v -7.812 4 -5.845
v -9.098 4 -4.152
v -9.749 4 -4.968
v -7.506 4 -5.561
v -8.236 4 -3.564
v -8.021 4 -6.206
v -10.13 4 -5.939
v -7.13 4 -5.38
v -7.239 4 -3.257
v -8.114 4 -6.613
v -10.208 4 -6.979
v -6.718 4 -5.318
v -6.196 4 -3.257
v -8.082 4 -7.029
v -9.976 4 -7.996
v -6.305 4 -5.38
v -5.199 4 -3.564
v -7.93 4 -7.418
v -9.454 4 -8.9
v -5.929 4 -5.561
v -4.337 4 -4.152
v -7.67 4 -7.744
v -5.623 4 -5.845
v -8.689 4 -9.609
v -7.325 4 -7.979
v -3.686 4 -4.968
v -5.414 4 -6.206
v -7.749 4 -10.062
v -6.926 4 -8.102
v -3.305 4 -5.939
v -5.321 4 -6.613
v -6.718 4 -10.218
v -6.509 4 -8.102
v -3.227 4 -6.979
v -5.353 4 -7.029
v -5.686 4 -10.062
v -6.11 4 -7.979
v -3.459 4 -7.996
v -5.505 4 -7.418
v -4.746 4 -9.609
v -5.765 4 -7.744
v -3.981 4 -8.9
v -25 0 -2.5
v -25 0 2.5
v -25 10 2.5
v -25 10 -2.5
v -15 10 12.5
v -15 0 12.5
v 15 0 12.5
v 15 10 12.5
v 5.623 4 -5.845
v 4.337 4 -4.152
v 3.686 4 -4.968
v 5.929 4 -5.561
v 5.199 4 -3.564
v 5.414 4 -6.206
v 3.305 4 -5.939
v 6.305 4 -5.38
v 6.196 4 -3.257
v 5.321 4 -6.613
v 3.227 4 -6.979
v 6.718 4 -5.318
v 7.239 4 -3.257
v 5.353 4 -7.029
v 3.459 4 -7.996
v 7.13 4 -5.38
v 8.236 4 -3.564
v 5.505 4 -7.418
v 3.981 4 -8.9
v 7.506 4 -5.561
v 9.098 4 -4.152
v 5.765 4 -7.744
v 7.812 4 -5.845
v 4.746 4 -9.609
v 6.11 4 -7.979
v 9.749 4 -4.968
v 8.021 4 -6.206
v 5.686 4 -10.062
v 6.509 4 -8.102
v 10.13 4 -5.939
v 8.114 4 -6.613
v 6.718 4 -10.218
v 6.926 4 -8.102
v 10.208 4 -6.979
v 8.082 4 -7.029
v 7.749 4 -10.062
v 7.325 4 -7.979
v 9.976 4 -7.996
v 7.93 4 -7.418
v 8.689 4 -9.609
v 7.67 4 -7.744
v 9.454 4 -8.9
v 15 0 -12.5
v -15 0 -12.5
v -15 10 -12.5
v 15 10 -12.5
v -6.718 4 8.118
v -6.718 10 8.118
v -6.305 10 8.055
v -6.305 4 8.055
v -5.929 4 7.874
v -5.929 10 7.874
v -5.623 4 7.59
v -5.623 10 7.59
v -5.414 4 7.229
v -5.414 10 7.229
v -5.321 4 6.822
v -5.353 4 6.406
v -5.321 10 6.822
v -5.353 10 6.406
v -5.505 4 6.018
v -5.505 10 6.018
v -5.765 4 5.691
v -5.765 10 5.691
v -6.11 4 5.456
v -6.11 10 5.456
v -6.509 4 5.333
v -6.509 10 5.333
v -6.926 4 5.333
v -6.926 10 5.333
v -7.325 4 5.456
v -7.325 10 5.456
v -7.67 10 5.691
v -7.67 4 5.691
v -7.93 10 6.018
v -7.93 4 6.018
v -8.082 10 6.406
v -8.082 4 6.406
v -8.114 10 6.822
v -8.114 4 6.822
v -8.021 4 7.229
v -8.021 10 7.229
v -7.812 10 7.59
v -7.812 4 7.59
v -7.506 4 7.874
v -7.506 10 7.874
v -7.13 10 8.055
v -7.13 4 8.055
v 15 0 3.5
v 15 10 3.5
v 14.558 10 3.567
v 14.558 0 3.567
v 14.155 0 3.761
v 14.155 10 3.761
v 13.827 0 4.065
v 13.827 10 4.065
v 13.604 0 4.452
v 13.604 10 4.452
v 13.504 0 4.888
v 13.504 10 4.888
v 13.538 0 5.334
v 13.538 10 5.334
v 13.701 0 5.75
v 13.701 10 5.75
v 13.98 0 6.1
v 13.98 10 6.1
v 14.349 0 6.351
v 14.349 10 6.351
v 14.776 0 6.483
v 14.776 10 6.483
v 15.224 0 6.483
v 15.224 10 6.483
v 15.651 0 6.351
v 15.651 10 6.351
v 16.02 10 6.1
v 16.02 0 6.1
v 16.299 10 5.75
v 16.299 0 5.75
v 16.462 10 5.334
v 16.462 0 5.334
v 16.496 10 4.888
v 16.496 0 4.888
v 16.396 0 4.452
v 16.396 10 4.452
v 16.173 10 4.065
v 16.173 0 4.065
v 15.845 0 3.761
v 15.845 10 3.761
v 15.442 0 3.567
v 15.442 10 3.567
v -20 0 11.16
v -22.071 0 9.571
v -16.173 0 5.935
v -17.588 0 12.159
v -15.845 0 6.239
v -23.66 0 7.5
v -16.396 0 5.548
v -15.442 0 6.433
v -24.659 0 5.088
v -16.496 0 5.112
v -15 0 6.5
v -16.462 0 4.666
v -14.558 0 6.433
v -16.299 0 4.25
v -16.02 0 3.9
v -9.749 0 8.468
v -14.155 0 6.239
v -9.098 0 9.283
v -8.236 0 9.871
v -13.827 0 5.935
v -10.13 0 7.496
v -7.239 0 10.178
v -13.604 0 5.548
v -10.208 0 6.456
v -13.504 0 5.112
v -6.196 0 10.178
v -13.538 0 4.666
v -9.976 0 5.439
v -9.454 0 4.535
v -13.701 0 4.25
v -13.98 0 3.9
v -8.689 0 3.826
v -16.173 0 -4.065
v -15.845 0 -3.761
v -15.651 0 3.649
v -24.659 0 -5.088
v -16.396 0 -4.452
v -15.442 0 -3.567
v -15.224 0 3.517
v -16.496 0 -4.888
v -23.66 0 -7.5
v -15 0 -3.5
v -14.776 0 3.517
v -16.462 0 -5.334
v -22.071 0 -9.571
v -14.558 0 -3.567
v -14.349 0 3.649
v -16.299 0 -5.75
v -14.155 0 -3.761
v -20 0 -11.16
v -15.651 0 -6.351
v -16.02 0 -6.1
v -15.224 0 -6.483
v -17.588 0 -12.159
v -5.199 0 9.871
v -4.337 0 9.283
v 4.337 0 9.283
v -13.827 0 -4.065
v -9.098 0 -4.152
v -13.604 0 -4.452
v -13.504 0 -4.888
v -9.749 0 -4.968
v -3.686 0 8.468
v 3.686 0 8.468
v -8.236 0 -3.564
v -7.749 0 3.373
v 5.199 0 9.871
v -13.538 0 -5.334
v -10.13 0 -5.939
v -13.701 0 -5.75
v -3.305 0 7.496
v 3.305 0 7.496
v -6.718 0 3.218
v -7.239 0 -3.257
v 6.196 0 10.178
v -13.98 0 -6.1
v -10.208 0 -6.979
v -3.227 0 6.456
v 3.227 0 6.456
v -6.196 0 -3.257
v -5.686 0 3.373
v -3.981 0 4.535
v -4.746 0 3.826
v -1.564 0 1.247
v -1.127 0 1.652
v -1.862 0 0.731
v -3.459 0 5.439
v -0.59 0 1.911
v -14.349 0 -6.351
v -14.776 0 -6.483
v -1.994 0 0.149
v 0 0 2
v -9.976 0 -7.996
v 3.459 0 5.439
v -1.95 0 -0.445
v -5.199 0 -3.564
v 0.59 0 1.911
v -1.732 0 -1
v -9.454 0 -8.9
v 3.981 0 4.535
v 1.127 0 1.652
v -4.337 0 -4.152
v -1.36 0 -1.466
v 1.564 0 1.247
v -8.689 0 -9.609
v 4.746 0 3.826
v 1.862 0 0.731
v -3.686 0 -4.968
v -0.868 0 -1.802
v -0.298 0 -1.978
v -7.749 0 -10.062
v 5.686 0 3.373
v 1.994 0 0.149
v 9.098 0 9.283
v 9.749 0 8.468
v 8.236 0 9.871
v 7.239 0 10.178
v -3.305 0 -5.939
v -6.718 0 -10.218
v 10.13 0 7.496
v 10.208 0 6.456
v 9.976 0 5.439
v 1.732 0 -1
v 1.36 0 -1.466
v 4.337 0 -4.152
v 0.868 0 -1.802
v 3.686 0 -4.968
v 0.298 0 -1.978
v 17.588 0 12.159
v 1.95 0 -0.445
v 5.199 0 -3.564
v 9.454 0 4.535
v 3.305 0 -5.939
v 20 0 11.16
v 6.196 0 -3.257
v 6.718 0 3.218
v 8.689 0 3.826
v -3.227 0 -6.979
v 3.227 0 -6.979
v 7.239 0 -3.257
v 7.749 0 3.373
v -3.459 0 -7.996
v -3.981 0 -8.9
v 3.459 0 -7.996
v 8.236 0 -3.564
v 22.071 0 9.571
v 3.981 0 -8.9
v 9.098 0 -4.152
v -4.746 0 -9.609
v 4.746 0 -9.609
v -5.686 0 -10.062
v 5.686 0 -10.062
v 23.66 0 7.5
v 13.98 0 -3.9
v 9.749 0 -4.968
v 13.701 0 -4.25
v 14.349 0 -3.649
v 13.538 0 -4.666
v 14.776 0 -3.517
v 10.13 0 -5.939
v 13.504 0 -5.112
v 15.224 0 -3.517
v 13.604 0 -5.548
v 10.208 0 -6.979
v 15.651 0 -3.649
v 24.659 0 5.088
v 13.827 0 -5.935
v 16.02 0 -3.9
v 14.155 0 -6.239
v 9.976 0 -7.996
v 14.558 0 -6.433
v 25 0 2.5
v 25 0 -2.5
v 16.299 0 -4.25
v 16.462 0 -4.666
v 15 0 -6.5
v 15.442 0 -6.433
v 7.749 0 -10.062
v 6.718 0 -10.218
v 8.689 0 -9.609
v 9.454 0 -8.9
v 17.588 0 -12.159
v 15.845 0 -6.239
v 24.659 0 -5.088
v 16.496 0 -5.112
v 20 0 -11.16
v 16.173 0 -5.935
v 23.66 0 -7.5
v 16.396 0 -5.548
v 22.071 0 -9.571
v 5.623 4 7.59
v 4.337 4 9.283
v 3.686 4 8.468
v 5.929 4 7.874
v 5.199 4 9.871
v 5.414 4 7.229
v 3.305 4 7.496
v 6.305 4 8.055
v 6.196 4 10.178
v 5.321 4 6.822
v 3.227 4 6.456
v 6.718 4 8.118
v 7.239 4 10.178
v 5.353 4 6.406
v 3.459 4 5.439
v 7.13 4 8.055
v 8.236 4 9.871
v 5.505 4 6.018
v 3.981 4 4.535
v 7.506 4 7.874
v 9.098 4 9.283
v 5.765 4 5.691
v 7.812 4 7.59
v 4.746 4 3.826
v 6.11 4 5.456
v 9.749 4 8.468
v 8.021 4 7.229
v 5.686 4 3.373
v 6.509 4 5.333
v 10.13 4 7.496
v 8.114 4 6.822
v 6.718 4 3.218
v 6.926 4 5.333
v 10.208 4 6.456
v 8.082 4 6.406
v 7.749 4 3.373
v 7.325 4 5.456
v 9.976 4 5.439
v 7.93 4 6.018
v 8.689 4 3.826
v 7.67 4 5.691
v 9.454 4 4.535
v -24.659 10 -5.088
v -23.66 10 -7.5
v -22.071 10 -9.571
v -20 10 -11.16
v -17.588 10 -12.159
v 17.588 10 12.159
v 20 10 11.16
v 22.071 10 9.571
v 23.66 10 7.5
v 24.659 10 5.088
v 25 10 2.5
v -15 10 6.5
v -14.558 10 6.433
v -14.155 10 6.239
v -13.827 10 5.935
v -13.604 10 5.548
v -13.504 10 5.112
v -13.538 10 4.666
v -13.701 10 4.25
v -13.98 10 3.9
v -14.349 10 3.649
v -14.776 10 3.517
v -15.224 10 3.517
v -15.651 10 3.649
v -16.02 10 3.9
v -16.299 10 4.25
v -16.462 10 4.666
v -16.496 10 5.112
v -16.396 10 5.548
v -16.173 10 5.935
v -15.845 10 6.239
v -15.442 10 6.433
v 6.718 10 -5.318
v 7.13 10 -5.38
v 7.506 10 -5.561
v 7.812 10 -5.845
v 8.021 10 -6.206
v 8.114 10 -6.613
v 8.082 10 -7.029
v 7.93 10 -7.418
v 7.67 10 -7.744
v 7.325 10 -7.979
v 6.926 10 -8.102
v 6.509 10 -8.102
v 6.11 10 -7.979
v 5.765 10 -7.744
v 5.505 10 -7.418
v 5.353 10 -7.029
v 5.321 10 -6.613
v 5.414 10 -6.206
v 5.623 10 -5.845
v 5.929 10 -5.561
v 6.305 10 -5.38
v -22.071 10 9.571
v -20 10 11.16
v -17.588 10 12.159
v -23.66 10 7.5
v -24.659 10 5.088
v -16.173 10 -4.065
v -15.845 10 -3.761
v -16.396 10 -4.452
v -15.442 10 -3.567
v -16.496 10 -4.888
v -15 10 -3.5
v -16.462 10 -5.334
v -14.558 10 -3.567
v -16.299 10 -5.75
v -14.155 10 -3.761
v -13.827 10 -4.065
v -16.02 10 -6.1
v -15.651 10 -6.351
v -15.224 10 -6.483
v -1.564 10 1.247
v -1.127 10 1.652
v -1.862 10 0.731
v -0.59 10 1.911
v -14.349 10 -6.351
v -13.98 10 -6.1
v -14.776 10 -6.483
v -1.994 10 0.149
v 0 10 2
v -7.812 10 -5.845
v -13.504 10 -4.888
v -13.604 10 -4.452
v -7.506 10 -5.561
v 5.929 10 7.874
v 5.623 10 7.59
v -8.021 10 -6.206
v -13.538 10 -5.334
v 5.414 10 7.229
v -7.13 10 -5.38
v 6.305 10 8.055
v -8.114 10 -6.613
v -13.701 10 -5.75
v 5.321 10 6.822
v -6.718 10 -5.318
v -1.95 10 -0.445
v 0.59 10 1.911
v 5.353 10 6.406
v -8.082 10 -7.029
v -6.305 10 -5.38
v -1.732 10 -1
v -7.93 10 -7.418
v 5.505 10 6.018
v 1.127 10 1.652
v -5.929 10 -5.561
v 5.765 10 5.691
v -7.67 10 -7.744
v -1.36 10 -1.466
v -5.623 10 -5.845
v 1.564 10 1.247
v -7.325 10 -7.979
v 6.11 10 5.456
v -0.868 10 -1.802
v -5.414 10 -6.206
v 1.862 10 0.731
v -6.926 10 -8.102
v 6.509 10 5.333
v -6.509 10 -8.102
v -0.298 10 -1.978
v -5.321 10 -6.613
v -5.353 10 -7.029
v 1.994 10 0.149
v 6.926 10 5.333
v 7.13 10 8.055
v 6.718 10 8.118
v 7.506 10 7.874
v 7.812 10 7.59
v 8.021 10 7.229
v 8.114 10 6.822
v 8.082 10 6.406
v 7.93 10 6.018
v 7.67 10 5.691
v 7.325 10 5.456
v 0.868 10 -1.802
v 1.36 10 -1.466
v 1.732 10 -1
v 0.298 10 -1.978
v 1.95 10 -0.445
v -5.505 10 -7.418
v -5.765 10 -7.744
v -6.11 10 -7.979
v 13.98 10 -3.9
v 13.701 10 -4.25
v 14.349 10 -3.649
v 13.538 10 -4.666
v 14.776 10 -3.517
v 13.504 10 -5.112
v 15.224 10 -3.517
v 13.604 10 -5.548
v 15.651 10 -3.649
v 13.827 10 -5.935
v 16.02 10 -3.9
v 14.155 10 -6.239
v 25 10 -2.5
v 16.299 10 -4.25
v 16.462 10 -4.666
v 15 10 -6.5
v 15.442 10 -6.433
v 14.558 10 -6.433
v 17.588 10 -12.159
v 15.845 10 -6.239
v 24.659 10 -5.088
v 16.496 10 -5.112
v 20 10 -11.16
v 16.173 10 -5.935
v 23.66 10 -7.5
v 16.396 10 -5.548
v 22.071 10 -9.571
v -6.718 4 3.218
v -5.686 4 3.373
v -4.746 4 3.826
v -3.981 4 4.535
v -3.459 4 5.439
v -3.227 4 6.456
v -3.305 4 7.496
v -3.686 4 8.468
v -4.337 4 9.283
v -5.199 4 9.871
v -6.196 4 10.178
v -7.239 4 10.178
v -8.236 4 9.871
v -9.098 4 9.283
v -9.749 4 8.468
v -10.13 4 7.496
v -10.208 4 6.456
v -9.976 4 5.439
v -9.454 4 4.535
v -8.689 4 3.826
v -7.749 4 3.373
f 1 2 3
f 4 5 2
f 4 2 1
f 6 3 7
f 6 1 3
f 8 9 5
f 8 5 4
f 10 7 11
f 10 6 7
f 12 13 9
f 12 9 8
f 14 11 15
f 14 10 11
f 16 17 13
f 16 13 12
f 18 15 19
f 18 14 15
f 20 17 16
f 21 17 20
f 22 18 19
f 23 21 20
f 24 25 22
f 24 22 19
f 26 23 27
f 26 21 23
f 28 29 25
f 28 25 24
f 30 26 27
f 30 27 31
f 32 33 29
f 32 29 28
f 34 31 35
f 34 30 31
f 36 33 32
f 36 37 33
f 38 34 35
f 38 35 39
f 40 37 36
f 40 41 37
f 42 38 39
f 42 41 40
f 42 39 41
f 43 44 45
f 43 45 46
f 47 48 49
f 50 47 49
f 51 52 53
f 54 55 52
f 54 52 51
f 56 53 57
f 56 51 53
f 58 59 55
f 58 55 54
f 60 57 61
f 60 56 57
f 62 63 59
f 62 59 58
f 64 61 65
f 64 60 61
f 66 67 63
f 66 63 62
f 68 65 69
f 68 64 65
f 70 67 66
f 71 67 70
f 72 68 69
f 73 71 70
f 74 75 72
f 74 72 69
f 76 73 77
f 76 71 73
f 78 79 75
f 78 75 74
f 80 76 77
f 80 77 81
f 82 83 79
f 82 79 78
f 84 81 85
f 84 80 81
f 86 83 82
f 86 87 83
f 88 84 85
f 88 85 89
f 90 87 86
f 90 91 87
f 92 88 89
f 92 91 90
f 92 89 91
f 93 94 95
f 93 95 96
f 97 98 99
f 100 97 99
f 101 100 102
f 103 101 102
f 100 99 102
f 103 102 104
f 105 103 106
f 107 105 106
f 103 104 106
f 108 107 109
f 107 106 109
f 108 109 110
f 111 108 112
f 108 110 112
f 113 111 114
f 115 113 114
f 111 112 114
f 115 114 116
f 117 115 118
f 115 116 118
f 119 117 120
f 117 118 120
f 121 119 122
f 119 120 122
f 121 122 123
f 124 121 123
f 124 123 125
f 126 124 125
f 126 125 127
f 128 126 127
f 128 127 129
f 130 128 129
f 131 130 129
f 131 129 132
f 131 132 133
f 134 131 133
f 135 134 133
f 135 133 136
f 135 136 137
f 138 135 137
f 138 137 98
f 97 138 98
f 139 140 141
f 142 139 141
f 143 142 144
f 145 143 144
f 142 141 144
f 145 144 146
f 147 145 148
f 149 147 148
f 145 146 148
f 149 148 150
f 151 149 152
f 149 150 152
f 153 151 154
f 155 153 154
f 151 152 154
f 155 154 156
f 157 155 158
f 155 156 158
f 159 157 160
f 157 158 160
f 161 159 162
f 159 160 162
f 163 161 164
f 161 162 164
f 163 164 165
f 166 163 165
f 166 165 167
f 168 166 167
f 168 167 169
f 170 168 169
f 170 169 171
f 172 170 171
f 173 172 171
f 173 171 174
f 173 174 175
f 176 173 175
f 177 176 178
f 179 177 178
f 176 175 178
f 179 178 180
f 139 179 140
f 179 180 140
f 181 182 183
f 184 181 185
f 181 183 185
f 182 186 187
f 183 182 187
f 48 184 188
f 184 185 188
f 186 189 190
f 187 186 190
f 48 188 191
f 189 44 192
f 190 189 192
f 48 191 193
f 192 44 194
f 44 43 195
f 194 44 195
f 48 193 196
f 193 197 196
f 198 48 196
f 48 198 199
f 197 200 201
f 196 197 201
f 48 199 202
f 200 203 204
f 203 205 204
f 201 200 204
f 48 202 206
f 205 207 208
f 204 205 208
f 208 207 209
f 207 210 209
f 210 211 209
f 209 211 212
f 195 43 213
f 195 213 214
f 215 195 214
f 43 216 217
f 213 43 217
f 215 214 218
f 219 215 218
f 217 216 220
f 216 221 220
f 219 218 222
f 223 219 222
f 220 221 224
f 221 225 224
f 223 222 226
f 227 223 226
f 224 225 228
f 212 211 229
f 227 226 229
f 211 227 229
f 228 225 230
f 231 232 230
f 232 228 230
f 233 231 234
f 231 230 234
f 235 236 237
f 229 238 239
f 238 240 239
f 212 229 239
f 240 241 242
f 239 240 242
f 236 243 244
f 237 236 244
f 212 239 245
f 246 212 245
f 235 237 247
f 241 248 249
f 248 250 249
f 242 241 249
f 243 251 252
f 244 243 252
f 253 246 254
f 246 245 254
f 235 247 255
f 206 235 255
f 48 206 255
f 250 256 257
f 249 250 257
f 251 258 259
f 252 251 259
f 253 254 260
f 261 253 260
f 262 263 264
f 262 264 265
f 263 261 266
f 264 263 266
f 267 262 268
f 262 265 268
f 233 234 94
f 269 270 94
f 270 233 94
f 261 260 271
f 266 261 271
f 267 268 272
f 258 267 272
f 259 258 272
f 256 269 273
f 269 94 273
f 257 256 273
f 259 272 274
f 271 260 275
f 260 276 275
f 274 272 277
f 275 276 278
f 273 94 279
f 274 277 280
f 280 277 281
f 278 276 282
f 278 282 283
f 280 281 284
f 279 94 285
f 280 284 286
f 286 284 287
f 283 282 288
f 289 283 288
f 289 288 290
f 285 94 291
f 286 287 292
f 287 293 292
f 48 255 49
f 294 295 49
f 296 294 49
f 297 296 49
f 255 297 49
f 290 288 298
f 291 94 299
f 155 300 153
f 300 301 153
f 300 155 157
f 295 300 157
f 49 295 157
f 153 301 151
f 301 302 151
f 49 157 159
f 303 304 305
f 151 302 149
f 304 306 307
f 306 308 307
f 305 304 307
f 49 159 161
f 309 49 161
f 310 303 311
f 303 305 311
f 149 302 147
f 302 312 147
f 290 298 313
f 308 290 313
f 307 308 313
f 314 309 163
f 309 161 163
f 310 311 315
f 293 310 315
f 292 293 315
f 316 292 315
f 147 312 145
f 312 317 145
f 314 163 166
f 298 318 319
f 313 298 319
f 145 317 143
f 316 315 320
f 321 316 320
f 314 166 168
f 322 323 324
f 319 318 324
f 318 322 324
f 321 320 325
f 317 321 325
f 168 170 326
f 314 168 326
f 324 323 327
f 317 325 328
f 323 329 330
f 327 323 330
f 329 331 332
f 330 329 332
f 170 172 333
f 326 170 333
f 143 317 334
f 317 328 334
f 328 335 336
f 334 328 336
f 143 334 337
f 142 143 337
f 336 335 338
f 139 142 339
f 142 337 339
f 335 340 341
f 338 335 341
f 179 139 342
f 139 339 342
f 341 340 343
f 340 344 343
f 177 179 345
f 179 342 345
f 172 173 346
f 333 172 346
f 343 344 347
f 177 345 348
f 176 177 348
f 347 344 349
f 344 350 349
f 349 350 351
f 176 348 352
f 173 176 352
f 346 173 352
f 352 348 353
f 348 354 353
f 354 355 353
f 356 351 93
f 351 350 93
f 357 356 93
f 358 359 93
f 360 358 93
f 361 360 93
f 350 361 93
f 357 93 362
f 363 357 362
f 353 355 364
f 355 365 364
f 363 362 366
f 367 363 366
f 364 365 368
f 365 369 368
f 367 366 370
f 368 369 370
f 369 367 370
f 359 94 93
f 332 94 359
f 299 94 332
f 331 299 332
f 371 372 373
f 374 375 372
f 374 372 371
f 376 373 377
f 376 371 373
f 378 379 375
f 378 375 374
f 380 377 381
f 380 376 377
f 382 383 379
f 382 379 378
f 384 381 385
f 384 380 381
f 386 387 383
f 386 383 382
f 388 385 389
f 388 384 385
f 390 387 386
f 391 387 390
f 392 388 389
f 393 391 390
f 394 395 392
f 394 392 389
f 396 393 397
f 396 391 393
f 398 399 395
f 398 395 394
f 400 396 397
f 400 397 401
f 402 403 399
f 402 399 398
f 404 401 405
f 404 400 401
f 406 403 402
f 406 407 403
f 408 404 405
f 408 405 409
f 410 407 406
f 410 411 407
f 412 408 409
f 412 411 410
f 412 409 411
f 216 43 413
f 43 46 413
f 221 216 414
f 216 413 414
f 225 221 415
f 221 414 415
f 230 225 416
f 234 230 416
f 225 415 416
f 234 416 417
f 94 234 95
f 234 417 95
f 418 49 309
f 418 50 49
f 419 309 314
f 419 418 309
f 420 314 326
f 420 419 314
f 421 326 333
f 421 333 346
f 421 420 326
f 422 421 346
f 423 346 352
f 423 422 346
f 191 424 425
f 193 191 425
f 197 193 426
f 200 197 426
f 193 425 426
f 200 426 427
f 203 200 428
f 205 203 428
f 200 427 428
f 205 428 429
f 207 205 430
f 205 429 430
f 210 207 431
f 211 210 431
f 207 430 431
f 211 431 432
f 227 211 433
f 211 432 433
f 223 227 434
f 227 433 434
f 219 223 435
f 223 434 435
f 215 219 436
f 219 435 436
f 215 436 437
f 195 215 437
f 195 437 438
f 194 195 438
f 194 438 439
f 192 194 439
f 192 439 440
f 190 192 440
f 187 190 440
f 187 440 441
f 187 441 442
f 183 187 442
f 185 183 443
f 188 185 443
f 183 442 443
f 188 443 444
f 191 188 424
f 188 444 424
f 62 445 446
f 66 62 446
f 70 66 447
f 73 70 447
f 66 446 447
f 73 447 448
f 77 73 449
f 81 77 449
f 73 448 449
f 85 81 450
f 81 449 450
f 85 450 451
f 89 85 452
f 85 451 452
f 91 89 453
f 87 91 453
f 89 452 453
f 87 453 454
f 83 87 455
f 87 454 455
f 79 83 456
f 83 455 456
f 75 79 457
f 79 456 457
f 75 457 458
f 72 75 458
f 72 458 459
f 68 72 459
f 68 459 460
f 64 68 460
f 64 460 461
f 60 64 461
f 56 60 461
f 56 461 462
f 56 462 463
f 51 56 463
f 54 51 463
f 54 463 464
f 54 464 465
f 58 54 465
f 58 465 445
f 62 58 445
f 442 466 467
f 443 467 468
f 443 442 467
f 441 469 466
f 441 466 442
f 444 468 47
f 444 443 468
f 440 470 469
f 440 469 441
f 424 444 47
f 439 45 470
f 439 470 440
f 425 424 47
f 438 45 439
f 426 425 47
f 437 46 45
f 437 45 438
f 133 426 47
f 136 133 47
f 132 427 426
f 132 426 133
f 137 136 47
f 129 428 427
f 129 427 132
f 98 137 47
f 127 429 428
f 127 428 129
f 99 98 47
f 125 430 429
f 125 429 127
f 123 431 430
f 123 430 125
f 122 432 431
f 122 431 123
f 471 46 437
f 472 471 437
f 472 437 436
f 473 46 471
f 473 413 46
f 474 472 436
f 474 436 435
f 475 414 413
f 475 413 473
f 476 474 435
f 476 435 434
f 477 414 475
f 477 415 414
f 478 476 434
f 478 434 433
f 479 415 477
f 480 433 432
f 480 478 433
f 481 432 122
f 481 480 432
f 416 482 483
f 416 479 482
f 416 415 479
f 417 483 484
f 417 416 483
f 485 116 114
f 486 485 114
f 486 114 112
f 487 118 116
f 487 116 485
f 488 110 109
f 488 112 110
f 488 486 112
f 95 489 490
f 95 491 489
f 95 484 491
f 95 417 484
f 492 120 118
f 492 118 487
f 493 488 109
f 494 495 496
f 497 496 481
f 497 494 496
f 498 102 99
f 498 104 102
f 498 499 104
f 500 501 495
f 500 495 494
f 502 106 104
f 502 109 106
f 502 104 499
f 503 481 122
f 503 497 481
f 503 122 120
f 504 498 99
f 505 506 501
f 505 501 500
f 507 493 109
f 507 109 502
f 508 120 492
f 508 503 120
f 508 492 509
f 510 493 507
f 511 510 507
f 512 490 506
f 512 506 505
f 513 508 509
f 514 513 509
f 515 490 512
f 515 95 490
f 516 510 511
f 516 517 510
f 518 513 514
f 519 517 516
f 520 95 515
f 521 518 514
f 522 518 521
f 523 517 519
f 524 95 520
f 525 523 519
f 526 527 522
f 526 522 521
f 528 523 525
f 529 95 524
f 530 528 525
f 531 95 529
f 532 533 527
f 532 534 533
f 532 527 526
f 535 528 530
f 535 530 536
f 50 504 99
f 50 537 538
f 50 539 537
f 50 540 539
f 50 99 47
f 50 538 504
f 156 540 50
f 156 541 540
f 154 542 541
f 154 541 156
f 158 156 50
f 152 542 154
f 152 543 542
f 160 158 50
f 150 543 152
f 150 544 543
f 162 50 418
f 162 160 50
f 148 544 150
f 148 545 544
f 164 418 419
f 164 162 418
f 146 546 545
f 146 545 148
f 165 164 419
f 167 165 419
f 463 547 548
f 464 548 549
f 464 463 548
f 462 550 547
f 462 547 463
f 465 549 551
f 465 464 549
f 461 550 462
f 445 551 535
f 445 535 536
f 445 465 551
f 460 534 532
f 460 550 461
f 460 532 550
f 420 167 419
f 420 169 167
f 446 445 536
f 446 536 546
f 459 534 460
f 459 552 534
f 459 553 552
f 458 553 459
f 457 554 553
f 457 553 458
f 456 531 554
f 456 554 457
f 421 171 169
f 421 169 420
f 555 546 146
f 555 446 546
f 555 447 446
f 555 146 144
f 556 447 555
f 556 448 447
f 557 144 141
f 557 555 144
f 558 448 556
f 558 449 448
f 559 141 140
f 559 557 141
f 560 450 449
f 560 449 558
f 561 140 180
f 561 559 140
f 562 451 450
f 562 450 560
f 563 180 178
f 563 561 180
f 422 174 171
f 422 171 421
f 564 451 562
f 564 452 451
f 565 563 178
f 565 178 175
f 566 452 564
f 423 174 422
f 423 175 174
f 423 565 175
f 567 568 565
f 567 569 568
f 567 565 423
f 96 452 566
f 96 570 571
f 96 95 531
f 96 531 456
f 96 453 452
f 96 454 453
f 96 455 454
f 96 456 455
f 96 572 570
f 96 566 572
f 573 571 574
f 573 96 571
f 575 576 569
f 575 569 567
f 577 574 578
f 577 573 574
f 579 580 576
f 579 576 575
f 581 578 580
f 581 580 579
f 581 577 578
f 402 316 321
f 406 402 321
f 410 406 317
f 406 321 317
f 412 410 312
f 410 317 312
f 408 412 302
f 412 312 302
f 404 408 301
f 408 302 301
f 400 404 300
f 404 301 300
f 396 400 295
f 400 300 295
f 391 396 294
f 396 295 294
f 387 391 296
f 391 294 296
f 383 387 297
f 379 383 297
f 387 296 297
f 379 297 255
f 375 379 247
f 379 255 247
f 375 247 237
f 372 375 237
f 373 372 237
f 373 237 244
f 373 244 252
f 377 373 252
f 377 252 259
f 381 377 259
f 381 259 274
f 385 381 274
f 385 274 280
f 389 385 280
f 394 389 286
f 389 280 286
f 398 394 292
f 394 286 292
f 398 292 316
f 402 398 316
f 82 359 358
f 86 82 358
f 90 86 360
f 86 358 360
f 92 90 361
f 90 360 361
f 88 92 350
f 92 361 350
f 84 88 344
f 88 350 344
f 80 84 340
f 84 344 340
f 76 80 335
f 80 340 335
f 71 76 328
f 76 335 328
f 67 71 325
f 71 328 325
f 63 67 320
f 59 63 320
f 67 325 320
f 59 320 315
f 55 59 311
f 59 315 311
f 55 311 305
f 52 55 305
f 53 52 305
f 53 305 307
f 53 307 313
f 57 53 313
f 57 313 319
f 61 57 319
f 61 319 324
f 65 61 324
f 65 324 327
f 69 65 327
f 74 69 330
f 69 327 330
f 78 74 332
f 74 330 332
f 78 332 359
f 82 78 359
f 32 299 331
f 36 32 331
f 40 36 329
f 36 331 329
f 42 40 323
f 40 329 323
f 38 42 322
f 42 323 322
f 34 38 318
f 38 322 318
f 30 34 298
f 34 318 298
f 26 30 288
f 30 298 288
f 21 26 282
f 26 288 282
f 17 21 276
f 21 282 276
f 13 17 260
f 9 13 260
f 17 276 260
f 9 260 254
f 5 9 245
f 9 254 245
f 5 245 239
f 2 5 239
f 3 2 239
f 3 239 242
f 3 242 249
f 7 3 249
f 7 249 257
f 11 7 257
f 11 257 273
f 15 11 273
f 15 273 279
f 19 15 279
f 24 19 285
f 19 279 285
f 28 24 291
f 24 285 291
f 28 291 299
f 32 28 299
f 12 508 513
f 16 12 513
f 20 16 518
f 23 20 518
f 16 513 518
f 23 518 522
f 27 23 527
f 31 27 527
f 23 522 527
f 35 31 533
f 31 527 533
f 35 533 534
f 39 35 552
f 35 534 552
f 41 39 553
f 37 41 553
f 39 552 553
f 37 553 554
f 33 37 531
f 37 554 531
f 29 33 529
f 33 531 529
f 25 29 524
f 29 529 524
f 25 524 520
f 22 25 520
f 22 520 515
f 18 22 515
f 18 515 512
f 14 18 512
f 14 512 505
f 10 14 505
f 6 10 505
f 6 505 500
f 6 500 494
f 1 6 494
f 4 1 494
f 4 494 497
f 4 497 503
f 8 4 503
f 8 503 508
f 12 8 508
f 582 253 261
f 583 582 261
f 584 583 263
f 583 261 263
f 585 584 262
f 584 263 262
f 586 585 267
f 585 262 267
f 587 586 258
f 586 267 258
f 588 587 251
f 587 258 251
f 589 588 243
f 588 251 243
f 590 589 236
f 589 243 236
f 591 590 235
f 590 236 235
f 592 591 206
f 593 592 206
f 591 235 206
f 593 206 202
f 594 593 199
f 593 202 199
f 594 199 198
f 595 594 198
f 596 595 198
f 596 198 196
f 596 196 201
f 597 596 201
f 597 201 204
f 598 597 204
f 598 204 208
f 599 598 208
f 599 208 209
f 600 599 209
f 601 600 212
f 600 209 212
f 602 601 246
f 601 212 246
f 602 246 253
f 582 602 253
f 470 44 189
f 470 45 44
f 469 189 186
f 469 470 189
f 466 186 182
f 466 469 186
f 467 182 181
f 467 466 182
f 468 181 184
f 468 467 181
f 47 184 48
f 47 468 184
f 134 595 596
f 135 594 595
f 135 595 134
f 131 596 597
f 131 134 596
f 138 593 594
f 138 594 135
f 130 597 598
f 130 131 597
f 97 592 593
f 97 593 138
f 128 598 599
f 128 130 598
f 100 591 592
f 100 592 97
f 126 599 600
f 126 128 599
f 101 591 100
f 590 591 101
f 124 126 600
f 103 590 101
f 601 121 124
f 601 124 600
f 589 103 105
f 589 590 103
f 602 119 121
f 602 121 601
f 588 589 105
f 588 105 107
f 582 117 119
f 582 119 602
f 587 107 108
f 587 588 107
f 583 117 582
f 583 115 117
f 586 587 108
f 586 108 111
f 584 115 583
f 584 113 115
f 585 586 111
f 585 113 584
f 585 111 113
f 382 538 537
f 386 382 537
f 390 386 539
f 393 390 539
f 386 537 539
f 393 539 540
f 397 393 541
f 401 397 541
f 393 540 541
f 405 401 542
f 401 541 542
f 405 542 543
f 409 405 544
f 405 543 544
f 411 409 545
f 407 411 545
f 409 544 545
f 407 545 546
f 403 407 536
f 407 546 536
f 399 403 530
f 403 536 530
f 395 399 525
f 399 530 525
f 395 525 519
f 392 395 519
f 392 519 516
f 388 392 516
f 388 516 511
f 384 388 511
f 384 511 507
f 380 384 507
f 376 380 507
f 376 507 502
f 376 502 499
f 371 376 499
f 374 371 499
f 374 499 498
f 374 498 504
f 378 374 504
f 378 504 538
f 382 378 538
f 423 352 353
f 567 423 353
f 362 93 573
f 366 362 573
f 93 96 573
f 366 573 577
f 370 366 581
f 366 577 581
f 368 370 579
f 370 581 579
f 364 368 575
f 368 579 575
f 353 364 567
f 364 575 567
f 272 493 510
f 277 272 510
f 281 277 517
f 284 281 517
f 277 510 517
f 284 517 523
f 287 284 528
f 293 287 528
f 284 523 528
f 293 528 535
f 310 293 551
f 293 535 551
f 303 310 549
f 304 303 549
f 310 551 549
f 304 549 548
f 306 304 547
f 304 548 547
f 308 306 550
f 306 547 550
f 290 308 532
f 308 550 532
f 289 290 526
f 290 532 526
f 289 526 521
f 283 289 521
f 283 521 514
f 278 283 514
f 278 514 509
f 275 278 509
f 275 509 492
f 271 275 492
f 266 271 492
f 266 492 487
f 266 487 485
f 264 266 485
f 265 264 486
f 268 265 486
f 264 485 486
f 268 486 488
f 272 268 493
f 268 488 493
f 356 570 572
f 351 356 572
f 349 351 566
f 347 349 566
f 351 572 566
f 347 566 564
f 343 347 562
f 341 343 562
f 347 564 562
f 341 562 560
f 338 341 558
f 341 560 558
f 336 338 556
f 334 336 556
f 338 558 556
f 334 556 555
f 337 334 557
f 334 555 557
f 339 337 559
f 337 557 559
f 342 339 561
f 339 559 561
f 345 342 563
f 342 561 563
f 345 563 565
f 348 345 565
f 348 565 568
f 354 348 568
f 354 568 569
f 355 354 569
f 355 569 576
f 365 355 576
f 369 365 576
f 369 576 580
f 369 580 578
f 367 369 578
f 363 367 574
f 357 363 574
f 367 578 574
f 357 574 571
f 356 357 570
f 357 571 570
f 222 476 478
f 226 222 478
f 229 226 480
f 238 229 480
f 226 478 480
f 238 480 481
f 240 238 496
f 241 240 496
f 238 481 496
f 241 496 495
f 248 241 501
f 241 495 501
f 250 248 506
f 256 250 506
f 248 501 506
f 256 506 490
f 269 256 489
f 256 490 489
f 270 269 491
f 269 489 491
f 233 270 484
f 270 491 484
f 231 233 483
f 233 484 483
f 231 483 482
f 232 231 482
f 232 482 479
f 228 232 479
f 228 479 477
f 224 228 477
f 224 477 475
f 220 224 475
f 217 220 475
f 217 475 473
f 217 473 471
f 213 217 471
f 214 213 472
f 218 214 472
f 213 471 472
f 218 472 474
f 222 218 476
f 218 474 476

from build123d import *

# Parameters (mm, degrees)
SKETCH1_W           = 50
SKETCH1_H           = 25
BOSS_EXTRUDE1_DEPTH = 10
SKETCH2_R           = 1.5
CUT_EXTRUDE1_DEPTH  = 10
SKETCH3_R           = 1.4
CUT_EXTRUDE2_DEPTH  = 10
SKETCH4_R           = 2
CUT_EXTRUDE3_DEPTH  = 10
FILLET1_R           = 10
SKETCH5_R           = 3.5
CUT_EXTRUDE4_DEPTH  = 4


with BuildPart() as part:
    # Sketch1 → Boss-Extrude1 (new body)
    with BuildSketch(Plane(origin=(0, 0, 0), x_dir=(1, 0, 0), z_dir=(0, 1, 0))):
        Rectangle(SKETCH1_W, SKETCH1_H)
    extrude(amount=BOSS_EXTRUDE1_DEPTH)

    # Sketch2 → Cut-Extrude1 (cut)
    with BuildSketch(Plane(origin=(0, 10, 0), x_dir=(1, 0, 0), z_dir=(0, 1, 0))):
        with Locations(Location((-15, 5, 0), (0, 0, 270))):
            Circle(SKETCH2_R)
        with Locations(Location((-15, -5, 0), (0, 0, 270))):
            Circle(SKETCH2_R)
        with Locations(Location((15, -5, 0), (0, 0, 90))):
            Circle(SKETCH2_R)
        with Locations(Location((15, 5, 0), (0, 0, 90))):
            Circle(SKETCH2_R)
    extrude(amount=-CUT_EXTRUDE1_DEPTH, mode=Mode.SUBTRACT)

    # Sketch3 → Cut-Extrude2 (cut)
    with BuildSketch(Plane(origin=(0, 10, 0), x_dir=(1, 0, 0), z_dir=(0, 1, 0))):
        with Locations(Location((-6.717514421, -6.717514421, 0), (0, 0, 270))):
            Circle(SKETCH3_R)
        with Locations(Location((6.717514421, -6.717514421, 0), (0, 0, 270))):
            Circle(SKETCH3_R)
        with Locations(Location((6.717514421, 6.717514421, 0), (0, 0, 270))):
            Circle(SKETCH3_R)
        with Locations(Location((-6.717514421, 6.717514421, 0), (0, 0, 270))):
            Circle(SKETCH3_R)
    extrude(amount=-CUT_EXTRUDE2_DEPTH, mode=Mode.SUBTRACT)

    # Sketch4 → Cut-Extrude3 (cut)
    with BuildSketch(Plane(origin=(0, 10, 0), x_dir=(1, 0, 0), z_dir=(0, 1, 0))):
        with Locations(Location((0, 0, 0), (0, 0, 270))):
            Circle(SKETCH4_R)
    extrude(amount=-CUT_EXTRUDE3_DEPTH, mode=Mode.SUBTRACT)

    # Fillet1
    fillet1_edges = [part.edges().sort_by_distance(p)[0] for p in [
        (-25, 5, -12.5),
        (25, 5, -12.5),
        (25, 5, 12.5),
        (-25, 5, 12.5),
    ]]
    fillet(fillet1_edges, radius=FILLET1_R)

    # Sketch5 → Cut-Extrude4 (cut)
    with BuildSketch(Plane.XZ):
        with Locations(Location((-6.717514421, 6.717514421, 0), (0, 0, 270))):
            Circle(SKETCH5_R)
        with Locations(Location((6.717514421, 6.717514421, 0), (0, 0, 270))):
            Circle(SKETCH5_R)
        with Locations(Location((6.717514421, -6.717514421, 0), (0, 0, 270))):
            Circle(SKETCH5_R)
        with Locations(Location((-6.717514421, -6.717514421, 0), (0, 0, 270))):
            Circle(SKETCH5_R)
    extrude(amount=-CUT_EXTRUDE4_DEPTH, mode=Mode.SUBTRACT)


solid = part.part
